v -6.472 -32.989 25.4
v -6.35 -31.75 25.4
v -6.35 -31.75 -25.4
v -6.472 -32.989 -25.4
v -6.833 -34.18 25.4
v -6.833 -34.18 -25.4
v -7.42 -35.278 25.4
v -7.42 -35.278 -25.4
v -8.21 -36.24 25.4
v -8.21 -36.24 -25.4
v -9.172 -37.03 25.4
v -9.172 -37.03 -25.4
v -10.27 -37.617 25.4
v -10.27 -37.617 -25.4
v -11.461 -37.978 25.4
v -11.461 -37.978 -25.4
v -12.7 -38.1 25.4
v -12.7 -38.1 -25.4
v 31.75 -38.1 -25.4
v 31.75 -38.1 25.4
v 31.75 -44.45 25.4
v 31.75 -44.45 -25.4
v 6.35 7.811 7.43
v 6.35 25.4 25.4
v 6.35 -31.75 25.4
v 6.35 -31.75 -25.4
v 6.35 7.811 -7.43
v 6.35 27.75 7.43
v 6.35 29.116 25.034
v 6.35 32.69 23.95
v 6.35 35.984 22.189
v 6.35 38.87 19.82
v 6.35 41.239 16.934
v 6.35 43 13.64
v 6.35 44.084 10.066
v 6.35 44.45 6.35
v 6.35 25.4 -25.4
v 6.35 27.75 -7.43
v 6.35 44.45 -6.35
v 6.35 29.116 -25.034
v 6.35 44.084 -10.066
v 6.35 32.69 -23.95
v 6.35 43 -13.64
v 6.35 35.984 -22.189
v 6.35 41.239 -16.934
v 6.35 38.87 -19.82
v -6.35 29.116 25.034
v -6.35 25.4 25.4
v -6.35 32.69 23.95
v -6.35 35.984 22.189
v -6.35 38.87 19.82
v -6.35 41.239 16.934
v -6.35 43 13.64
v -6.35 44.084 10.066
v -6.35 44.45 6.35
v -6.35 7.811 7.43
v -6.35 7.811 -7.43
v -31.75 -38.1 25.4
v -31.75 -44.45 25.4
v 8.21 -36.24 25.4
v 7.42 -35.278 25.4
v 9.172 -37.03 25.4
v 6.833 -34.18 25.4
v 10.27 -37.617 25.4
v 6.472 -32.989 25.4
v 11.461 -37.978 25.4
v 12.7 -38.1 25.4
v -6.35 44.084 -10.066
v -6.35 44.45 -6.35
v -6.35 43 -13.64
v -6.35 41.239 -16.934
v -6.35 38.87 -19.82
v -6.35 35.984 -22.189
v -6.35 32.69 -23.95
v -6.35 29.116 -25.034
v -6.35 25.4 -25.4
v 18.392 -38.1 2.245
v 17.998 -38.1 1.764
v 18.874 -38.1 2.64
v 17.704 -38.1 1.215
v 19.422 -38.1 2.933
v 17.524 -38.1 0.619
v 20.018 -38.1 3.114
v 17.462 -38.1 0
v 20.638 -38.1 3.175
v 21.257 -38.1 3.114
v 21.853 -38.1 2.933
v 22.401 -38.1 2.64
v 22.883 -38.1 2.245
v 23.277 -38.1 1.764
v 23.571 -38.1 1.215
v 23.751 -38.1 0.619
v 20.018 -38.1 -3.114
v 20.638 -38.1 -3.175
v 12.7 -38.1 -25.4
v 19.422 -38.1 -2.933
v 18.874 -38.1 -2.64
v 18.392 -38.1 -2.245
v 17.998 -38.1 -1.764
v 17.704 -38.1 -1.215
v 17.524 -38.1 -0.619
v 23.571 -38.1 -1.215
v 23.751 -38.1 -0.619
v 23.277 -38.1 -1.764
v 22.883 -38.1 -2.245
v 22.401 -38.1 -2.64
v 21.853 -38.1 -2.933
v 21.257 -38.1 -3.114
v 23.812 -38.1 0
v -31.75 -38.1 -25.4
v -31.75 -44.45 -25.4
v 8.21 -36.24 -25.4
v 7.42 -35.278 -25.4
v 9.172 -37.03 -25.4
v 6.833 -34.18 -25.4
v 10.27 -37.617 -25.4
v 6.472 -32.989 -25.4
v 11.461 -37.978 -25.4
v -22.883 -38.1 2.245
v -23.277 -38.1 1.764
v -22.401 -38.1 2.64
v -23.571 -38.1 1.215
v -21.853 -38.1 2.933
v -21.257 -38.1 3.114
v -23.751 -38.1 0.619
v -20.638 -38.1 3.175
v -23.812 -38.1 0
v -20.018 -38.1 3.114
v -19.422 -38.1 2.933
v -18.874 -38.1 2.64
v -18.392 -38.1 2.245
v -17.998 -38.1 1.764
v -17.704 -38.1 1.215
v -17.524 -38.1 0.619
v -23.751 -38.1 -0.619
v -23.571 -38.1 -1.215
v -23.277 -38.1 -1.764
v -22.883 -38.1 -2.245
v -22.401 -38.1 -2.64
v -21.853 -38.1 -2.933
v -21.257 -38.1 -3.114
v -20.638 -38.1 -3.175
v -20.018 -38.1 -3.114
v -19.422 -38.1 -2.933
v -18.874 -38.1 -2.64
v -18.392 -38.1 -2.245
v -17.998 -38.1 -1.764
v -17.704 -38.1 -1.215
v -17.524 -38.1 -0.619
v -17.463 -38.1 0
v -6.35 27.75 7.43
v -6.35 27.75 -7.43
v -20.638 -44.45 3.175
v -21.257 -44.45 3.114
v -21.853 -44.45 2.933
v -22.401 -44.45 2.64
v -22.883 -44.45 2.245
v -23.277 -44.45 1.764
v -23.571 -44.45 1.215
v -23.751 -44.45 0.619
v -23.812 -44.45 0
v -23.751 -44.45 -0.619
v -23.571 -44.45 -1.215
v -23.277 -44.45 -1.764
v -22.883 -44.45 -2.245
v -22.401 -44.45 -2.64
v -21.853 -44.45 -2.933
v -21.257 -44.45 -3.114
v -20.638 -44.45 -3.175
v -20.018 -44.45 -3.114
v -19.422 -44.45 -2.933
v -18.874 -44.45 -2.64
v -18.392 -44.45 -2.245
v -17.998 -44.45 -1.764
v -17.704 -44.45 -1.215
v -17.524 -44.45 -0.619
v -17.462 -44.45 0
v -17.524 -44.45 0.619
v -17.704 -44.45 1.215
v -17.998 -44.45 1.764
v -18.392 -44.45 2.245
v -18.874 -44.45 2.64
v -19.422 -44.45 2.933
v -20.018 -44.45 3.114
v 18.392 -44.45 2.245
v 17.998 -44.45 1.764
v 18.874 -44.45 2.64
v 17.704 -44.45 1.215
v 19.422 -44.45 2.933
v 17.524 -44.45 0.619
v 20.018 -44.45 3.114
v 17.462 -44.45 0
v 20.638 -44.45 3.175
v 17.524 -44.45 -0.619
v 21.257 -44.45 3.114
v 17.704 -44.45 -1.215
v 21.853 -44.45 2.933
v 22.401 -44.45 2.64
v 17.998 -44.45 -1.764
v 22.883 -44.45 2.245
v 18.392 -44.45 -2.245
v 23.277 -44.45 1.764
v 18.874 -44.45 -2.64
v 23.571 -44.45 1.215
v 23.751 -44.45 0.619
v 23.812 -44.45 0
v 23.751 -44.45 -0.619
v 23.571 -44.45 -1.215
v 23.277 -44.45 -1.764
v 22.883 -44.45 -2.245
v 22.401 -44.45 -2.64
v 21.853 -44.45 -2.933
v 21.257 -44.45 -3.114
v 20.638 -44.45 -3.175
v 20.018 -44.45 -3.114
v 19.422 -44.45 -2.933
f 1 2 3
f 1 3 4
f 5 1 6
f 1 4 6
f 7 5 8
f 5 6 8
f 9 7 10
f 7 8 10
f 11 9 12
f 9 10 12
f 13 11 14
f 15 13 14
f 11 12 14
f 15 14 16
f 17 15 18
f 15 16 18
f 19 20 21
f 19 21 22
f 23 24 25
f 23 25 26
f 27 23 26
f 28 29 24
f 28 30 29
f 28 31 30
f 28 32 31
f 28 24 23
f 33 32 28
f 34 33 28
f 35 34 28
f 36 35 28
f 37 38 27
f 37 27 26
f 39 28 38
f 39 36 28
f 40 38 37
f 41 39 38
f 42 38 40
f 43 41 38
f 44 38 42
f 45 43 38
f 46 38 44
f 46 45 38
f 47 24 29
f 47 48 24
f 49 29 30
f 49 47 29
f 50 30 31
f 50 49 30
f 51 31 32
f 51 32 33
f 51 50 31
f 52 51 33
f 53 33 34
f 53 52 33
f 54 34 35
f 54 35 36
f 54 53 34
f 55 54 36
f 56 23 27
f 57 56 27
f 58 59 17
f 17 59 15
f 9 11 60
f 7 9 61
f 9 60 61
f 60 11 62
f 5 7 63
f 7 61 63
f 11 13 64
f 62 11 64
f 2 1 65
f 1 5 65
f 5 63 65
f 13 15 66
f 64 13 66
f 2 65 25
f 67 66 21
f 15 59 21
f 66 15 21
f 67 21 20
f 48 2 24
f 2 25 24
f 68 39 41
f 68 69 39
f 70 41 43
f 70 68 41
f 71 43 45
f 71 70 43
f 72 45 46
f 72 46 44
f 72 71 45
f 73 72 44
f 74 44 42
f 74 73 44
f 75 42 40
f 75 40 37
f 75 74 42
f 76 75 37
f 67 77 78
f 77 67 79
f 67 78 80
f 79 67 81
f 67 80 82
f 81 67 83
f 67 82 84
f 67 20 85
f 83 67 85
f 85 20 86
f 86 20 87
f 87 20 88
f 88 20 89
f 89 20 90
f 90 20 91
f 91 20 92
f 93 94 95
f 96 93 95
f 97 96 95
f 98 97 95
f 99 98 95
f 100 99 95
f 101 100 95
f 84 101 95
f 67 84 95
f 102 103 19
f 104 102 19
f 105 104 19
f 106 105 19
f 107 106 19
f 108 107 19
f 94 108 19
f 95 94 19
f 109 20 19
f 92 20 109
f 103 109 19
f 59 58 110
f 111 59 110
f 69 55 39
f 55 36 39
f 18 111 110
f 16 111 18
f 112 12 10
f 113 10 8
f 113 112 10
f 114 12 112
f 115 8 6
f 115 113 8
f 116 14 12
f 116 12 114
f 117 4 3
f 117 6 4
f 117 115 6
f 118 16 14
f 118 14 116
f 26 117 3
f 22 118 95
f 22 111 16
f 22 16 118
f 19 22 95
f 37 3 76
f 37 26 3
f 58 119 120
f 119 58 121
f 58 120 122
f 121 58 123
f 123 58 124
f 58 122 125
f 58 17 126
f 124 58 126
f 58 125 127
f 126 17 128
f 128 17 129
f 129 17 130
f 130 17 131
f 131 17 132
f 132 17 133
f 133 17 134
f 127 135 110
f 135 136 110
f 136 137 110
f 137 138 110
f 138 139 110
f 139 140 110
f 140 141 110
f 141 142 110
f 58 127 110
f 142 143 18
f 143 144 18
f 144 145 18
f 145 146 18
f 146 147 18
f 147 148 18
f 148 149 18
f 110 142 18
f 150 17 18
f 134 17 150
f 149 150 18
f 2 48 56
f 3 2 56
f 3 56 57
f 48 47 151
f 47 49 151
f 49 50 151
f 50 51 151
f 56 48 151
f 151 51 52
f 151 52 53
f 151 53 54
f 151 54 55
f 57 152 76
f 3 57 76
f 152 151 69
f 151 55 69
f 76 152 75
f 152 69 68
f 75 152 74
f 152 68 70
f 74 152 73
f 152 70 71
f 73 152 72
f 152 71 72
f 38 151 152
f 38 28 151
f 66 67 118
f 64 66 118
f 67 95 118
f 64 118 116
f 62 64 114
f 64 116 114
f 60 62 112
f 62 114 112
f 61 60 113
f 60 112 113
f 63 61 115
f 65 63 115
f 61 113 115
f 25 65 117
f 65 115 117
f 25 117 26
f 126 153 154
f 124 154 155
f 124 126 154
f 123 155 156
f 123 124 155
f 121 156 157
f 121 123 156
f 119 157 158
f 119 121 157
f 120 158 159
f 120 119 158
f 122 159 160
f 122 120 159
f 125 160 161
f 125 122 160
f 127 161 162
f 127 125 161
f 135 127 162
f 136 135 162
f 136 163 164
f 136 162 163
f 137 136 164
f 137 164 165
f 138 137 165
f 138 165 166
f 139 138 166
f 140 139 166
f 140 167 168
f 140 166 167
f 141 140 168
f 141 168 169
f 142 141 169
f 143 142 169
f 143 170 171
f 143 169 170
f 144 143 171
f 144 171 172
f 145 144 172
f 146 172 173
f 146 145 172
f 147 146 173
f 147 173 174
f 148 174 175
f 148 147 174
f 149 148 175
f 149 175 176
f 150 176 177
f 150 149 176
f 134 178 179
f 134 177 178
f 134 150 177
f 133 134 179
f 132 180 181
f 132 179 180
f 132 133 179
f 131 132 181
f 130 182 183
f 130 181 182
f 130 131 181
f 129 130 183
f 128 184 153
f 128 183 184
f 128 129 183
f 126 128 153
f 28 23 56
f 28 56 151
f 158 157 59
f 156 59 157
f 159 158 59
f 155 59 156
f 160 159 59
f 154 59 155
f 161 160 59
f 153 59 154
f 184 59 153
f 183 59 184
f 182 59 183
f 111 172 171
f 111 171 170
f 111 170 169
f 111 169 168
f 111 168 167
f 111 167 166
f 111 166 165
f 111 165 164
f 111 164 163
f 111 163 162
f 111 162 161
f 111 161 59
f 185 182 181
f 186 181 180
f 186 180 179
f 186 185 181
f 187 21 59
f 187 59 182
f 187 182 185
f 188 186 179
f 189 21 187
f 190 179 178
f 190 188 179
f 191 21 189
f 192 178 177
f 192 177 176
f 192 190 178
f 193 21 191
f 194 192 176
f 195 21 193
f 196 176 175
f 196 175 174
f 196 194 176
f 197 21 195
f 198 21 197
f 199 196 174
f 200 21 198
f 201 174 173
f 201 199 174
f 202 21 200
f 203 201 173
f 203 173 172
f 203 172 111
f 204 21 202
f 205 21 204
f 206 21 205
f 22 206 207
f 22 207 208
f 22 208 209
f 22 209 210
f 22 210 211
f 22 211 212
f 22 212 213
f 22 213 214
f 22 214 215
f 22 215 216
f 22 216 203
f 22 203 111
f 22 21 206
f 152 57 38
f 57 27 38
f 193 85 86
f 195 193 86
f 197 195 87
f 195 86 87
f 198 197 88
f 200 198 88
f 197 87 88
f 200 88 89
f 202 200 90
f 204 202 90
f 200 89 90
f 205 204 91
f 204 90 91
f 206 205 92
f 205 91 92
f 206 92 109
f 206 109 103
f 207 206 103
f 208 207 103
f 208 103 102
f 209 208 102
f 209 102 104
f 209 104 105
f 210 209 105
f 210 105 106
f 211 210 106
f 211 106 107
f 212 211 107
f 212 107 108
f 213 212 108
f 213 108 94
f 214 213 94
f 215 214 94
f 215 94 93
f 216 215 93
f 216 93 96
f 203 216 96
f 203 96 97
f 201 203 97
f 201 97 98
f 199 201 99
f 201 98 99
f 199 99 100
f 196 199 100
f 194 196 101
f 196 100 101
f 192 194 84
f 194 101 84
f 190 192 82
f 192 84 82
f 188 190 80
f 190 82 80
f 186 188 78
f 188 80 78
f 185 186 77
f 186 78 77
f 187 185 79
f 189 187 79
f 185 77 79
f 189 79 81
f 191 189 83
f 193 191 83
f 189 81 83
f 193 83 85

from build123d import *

# Parameters (mm, degrees)
SKETCH1_W           = 50.8
SKETCH1_H           = 88.9
SKETCH1_W_2         = 14.859
SKETCH1_H_2         = 19.939
BOSS_EXTRUDE1_DEPTH = 6.35
SKETCH2_W           = 50.8
SKETCH2_H           = 6.35
BOSS_EXTRUDE2_DEPTH = 31.75
FILLET1_R           = 6.35
SKETCH3_R           = 3.175
CUT_EXTRUDE1_DEPTH  = 93.020242338
FILLET2_R           = 19.05


with BuildPart() as part:
    # Sketch1 → Boss-Extrude1 (new, symmetric)
    with BuildSketch(Plane(origin=(0, 0, 0), x_dir=(0, 0, -1), z_dir=(1, 0, 0))):
        Rectangle(SKETCH1_W, SKETCH1_H)
        with Locations((0, 17.78)):
            Rectangle(SKETCH1_W_2, SKETCH1_H_2, mode=Mode.SUBTRACT)
    extrude(amount=BOSS_EXTRUDE1_DEPTH, both=True)

    # Sketch2 → Boss-Extrude2 (add, symmetric)
    with BuildSketch(Plane(origin=(0, 0, 0), x_dir=(0, 0, -1), z_dir=(1, 0, 0))):
        with Locations((0, -41.275)):
            Rectangle(SKETCH2_W, SKETCH2_H)
    extrude(amount=BOSS_EXTRUDE2_DEPTH, both=True)

    # Fillet1
    fillet1_edges = [part.edges().sort_by_distance(p)[0] for p in [
        (6.35, -38.1, 0),
        (-6.35, -38.1, 0),
    ]]
    fillet(fillet1_edges, radius=FILLET1_R)

    # Sketch3 → Cut-Extrude1 (cut, through all)
    with BuildSketch(Plane(origin=(0, -38.1, 0), x_dir=(1, 0, 0), z_dir=(0, 1, 0))):
        with Locations(Location((20.6375, 0, 0), (0, 0, 270))):
            Circle(SKETCH3_R)
    cut_extrude1 = extrude(amount=-CUT_EXTRUDE1_DEPTH, mode=Mode.SUBTRACT)

    # Mirror1: Cut-Extrude1 across plane
    add(cut_extrude1.mirror(Plane(origin=(0, 0, 0), x_dir=(0, 0, 1), z_dir=(1, 0, 0))), mode=Mode.SUBTRACT)

    # Fillet2
    fillet2_edges = [part.edges().sort_by_distance(p)[0] for p in [
        (0, 44.45, 25.4),
        (0, 44.45, -25.4),
    ]]
    fillet(fillet2_edges, radius=FILLET2_R)


solid = part.part
